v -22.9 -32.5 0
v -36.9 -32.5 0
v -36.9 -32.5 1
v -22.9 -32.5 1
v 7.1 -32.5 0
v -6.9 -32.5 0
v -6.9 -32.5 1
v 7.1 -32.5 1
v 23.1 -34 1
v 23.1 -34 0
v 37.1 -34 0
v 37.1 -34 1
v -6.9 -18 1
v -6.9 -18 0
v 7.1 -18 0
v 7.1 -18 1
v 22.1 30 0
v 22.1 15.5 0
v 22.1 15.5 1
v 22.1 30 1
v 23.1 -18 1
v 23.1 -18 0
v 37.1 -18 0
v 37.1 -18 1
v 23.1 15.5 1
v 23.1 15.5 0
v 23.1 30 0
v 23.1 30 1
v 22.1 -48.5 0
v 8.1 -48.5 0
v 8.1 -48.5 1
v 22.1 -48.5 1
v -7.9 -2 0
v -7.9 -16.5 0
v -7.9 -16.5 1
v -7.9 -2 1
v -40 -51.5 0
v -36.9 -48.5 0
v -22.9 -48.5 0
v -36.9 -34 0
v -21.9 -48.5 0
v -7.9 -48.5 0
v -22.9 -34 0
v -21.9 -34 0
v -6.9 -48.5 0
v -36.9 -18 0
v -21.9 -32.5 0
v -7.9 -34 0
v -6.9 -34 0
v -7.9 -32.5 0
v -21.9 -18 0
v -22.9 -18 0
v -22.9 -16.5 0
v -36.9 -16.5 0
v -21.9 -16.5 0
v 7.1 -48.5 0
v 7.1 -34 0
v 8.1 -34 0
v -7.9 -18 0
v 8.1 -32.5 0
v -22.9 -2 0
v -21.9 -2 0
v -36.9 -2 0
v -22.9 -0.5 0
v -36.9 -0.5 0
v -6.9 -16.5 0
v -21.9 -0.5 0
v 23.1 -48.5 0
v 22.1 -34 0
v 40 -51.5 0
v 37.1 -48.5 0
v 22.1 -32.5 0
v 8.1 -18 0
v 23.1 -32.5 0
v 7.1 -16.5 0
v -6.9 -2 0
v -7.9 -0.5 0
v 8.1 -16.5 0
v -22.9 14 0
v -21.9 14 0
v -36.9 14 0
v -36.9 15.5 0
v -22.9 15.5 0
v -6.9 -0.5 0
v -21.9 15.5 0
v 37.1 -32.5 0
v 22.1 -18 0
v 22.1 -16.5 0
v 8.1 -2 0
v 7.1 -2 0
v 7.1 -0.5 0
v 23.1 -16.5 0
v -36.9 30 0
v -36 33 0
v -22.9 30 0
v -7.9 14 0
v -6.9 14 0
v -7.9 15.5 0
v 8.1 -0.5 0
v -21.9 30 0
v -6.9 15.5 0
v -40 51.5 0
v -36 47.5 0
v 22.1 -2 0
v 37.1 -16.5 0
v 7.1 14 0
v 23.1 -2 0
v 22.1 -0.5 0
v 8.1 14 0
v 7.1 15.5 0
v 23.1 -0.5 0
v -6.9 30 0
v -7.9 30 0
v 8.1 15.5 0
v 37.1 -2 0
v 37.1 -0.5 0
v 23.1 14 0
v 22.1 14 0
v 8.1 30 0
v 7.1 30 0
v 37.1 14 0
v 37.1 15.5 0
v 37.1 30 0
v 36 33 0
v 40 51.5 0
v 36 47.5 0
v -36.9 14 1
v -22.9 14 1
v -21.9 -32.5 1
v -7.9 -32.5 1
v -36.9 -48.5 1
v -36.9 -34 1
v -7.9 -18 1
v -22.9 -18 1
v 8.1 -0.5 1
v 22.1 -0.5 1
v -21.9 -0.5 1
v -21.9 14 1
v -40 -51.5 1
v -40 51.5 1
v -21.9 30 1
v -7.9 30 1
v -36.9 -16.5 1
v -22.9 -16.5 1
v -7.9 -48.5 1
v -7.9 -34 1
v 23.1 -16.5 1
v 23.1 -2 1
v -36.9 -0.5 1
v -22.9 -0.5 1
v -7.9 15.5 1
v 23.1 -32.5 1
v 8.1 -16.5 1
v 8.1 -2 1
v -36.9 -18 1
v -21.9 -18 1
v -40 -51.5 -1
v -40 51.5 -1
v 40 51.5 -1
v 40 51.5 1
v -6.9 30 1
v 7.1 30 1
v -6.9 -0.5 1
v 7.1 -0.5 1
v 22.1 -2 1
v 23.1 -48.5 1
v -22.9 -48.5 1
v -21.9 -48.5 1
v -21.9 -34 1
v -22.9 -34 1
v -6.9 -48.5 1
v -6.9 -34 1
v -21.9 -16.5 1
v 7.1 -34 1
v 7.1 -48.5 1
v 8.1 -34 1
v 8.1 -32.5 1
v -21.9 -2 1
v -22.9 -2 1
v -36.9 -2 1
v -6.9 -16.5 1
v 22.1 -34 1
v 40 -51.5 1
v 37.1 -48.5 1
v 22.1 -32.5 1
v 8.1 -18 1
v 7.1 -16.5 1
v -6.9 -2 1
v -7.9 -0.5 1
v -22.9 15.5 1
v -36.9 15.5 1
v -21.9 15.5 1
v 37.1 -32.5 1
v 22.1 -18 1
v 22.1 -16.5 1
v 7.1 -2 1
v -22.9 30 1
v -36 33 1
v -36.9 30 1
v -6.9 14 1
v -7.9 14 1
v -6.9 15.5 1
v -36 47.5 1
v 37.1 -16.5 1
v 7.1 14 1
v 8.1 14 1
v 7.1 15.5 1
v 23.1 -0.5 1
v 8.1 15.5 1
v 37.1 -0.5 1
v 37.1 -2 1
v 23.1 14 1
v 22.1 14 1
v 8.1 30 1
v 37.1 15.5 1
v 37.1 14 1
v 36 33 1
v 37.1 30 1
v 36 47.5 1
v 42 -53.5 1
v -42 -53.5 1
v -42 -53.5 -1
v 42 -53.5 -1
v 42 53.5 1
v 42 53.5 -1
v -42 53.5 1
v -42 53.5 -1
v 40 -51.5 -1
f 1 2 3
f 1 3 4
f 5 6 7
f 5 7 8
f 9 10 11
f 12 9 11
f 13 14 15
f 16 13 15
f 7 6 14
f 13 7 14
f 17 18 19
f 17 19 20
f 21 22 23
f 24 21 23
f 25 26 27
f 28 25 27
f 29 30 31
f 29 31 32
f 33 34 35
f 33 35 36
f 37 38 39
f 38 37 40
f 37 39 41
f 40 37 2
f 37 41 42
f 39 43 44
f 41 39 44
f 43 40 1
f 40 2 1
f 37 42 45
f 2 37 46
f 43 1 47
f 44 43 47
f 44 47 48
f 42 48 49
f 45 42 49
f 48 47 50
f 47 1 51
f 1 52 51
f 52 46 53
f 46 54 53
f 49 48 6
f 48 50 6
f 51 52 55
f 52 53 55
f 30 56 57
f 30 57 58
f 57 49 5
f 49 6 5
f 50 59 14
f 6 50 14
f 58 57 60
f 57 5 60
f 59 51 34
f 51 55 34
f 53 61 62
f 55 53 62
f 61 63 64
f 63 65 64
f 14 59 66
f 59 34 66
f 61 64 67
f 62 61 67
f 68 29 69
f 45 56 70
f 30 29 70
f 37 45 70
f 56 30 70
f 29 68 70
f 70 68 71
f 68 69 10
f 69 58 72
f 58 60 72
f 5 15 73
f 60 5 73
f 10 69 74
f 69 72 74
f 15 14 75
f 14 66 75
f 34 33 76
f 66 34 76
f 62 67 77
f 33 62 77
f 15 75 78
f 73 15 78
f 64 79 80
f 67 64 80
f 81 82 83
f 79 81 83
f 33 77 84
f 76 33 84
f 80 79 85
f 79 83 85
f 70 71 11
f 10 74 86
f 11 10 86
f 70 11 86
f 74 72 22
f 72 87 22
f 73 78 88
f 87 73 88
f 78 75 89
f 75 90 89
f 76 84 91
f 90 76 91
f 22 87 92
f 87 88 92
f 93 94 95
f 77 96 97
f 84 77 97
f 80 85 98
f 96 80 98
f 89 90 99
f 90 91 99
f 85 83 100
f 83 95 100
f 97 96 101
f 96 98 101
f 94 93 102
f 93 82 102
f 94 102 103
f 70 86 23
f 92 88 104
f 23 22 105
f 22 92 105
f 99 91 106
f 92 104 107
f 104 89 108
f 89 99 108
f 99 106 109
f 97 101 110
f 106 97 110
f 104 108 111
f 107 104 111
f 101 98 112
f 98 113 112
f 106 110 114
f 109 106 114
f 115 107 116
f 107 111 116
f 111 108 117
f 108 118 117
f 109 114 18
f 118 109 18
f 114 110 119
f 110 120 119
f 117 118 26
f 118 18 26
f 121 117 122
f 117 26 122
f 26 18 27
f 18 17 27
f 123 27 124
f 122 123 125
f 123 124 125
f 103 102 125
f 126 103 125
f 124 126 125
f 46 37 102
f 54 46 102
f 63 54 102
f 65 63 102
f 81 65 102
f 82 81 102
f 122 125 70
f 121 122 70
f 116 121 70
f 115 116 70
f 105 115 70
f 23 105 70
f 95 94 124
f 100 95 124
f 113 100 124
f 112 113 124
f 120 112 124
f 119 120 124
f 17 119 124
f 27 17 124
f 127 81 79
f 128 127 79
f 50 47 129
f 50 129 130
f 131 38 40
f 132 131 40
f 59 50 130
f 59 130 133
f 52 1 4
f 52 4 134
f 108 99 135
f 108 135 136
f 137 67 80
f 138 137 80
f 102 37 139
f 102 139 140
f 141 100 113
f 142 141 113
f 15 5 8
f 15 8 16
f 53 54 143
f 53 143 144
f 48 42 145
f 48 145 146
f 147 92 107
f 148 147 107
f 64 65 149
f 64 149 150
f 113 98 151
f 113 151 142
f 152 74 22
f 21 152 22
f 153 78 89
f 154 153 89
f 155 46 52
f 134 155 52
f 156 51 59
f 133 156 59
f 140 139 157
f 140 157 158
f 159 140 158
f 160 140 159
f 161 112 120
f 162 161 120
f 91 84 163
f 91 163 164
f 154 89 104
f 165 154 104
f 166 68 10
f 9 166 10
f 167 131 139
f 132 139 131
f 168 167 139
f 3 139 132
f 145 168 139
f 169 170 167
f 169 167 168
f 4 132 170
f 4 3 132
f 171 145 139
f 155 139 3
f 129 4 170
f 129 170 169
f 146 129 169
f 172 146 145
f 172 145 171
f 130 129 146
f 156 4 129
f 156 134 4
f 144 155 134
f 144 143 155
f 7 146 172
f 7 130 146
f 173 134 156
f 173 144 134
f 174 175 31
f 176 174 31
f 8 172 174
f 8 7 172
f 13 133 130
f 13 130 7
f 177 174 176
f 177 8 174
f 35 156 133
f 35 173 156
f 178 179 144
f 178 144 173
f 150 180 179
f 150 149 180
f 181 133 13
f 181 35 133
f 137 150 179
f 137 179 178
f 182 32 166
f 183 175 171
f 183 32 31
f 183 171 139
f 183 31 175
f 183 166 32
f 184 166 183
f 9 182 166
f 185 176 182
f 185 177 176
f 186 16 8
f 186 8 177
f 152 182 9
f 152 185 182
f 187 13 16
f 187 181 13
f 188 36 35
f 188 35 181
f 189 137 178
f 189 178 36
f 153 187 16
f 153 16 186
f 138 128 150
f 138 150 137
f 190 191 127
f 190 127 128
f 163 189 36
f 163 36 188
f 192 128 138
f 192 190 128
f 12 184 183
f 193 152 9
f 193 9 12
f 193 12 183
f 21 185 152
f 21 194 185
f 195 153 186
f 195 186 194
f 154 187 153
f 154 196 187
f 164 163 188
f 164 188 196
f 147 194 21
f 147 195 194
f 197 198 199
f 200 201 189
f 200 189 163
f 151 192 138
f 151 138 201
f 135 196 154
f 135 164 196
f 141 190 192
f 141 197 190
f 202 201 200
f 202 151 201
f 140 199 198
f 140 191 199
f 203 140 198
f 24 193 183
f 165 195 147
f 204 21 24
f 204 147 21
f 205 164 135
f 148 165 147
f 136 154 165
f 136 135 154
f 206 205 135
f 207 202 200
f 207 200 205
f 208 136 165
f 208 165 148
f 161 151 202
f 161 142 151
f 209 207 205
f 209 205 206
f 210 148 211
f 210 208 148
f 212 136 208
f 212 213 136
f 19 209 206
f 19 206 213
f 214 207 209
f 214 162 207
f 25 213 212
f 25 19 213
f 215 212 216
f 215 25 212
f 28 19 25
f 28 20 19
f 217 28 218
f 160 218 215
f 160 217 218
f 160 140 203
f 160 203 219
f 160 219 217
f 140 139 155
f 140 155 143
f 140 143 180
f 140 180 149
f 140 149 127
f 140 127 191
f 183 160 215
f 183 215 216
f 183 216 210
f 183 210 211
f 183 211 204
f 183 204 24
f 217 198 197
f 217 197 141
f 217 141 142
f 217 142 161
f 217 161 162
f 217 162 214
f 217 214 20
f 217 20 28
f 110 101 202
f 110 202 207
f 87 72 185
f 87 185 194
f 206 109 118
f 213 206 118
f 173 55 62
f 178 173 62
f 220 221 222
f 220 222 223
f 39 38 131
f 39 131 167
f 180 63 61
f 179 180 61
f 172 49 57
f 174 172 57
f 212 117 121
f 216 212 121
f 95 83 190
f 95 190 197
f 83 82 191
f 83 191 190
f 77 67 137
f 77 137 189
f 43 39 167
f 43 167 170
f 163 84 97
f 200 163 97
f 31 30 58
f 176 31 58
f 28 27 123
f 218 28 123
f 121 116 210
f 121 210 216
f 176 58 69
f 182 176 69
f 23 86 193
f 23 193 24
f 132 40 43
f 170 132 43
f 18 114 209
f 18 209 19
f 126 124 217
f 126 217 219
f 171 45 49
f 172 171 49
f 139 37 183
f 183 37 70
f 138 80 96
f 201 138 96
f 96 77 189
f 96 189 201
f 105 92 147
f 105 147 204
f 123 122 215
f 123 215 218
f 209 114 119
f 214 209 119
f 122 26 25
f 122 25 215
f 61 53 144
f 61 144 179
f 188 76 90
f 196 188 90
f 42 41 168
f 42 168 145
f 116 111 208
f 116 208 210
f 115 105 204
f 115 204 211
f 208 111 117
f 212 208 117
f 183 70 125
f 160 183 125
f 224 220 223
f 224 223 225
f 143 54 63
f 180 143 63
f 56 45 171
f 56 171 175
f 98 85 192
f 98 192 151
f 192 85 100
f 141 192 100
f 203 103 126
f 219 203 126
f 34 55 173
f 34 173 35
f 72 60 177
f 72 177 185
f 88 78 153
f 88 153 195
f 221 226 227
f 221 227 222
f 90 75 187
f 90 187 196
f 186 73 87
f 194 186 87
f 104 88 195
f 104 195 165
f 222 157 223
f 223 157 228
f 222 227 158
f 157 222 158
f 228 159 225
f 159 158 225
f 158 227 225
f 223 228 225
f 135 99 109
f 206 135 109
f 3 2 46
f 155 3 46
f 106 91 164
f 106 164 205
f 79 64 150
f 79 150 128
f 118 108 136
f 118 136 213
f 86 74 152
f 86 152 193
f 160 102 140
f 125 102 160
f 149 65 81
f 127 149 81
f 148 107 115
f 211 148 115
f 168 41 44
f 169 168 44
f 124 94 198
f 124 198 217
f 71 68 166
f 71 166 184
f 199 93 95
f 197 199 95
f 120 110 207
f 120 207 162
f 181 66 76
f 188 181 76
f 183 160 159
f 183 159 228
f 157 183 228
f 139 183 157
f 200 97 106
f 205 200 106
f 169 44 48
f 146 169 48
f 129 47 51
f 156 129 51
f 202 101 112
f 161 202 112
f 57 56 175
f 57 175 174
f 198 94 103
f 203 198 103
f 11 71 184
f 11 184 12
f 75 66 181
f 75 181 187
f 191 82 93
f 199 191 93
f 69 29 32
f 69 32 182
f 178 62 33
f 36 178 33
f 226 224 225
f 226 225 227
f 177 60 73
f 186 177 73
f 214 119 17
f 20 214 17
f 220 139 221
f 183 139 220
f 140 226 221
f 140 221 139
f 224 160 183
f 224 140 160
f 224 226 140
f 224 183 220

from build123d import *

# Parameters (mm, degrees)
F0_W     = 80
F0_H     = 103
F0_W_2   = 14
F0_H_2   = 14.5
F0_W_3   = 72
F1_DEPTH = 1
F2_W     = 40
F2_H     = 2
F3_DEPTH = 2


with BuildPart() as f1:
    # F0 (on Top) → F1 (new body)
    with BuildSketch(Plane.XY):
        Rectangle(F0_W, F0_H)
        with Locations((-29.9, -41.25)):
            Rectangle(F0_W_2, F0_H_2, mode=Mode.SUBTRACT)
        with Locations((-14.9, -41.25)):
            Rectangle(F0_W_2, F0_H_2, mode=Mode.SUBTRACT)
        with Locations((-29.9, -25.25)):
            Rectangle(F0_W_2, F0_H_2, mode=Mode.SUBTRACT)
        with Locations((-29.9, -9.25)):
            Rectangle(F0_W_2, F0_H_2, mode=Mode.SUBTRACT)
        with Locations((-14.9, -25.25)):
            Rectangle(F0_W_2, F0_H_2, mode=Mode.SUBTRACT)
        with Locations((-14.9, -9.25)):
            Rectangle(F0_W_2, F0_H_2, mode=Mode.SUBTRACT)
        with Locations((0.1, -41.25)):
            Rectangle(F0_W_2, F0_H_2, mode=Mode.SUBTRACT)
        with Locations((15.1, -41.25)):
            Rectangle(F0_W_2, F0_H_2, mode=Mode.SUBTRACT)
        with Locations((30.1, -41.25)):
            Rectangle(F0_W_2, F0_H_2, mode=Mode.SUBTRACT)
        with Locations((0.1, -25.25)):
            Rectangle(F0_W_2, F0_H_2, mode=Mode.SUBTRACT)
        with Locations((15.1, -25.25)):
            Rectangle(F0_W_2, F0_H_2, mode=Mode.SUBTRACT)
        with Locations((0.1, -9.25)):
            Rectangle(F0_W_2, F0_H_2, mode=Mode.SUBTRACT)
        with Locations((15.1, -9.25)):
            Rectangle(F0_W_2, F0_H_2, mode=Mode.SUBTRACT)
        with Locations((30.1, -25.25)):
            Rectangle(F0_W_2, F0_H_2, mode=Mode.SUBTRACT)
        with Locations((30.1, -9.25)):
            Rectangle(F0_W_2, F0_H_2, mode=Mode.SUBTRACT)
        with Locations((-29.9, 6.75)):
            Rectangle(F0_W_2, F0_H_2, mode=Mode.SUBTRACT)
        with Locations((-29.9, 22.75)):
            Rectangle(F0_W_2, F0_H_2, mode=Mode.SUBTRACT)
        with Locations((-14.9, 6.75)):
            Rectangle(F0_W_2, F0_H_2, mode=Mode.SUBTRACT)
        with Locations((-14.9, 22.75)):
            Rectangle(F0_W_2, F0_H_2, mode=Mode.SUBTRACT)
        with Locations((0.1, 6.75)):
            Rectangle(F0_W_2, F0_H_2, mode=Mode.SUBTRACT)
        with Locations((15.1, 6.75)):
            Rectangle(F0_W_2, F0_H_2, mode=Mode.SUBTRACT)
        with Locations((0.1, 22.75)):
            Rectangle(F0_W_2, F0_H_2, mode=Mode.SUBTRACT)
        with Locations((15.1, 22.75)):
            Rectangle(F0_W_2, F0_H_2, mode=Mode.SUBTRACT)
        with Locations((30.1, 6.75)):
            Rectangle(F0_W_2, F0_H_2, mode=Mode.SUBTRACT)
        with Locations((30.1, 22.75)):
            Rectangle(F0_W_2, F0_H_2, mode=Mode.SUBTRACT)
        with Locations((0, 40.25)):
            Rectangle(F0_W_3, F0_H_2, mode=Mode.SUBTRACT)
    extrude(amount=F1_DEPTH)


with BuildPart() as f3:
    # F2 (on face) → F3 (new body)
    with BuildSketch(Plane.XY.offset(1)):
        Polygon((0, -51.5), (-40, -51.5), (-42, -51.5), (-42, -53.5), (0, -53.5), align=None)
        Polygon((40, -51.5), (0, -51.5), (0, -53.5), (42, -53.5), (42, -51.5), align=None)
        Polygon((40, 51.5), (40, -51.5), (42, -51.5), (42, 53.5), (40, 53.5), align=None)
        Polygon((-42, -51.5), (-40, -51.5), (-40, 51.5), (-40, 53.5), (-42, 53.5), align=None)
        with Locations((-20, 52.5)):
            Rectangle(F2_W, F2_H)
        with Locations((20, 52.5)):
            Rectangle(F2_W, F2_H)
    extrude(amount=-F3_DEPTH)


solid = Compound([f1.part, f3.part])
